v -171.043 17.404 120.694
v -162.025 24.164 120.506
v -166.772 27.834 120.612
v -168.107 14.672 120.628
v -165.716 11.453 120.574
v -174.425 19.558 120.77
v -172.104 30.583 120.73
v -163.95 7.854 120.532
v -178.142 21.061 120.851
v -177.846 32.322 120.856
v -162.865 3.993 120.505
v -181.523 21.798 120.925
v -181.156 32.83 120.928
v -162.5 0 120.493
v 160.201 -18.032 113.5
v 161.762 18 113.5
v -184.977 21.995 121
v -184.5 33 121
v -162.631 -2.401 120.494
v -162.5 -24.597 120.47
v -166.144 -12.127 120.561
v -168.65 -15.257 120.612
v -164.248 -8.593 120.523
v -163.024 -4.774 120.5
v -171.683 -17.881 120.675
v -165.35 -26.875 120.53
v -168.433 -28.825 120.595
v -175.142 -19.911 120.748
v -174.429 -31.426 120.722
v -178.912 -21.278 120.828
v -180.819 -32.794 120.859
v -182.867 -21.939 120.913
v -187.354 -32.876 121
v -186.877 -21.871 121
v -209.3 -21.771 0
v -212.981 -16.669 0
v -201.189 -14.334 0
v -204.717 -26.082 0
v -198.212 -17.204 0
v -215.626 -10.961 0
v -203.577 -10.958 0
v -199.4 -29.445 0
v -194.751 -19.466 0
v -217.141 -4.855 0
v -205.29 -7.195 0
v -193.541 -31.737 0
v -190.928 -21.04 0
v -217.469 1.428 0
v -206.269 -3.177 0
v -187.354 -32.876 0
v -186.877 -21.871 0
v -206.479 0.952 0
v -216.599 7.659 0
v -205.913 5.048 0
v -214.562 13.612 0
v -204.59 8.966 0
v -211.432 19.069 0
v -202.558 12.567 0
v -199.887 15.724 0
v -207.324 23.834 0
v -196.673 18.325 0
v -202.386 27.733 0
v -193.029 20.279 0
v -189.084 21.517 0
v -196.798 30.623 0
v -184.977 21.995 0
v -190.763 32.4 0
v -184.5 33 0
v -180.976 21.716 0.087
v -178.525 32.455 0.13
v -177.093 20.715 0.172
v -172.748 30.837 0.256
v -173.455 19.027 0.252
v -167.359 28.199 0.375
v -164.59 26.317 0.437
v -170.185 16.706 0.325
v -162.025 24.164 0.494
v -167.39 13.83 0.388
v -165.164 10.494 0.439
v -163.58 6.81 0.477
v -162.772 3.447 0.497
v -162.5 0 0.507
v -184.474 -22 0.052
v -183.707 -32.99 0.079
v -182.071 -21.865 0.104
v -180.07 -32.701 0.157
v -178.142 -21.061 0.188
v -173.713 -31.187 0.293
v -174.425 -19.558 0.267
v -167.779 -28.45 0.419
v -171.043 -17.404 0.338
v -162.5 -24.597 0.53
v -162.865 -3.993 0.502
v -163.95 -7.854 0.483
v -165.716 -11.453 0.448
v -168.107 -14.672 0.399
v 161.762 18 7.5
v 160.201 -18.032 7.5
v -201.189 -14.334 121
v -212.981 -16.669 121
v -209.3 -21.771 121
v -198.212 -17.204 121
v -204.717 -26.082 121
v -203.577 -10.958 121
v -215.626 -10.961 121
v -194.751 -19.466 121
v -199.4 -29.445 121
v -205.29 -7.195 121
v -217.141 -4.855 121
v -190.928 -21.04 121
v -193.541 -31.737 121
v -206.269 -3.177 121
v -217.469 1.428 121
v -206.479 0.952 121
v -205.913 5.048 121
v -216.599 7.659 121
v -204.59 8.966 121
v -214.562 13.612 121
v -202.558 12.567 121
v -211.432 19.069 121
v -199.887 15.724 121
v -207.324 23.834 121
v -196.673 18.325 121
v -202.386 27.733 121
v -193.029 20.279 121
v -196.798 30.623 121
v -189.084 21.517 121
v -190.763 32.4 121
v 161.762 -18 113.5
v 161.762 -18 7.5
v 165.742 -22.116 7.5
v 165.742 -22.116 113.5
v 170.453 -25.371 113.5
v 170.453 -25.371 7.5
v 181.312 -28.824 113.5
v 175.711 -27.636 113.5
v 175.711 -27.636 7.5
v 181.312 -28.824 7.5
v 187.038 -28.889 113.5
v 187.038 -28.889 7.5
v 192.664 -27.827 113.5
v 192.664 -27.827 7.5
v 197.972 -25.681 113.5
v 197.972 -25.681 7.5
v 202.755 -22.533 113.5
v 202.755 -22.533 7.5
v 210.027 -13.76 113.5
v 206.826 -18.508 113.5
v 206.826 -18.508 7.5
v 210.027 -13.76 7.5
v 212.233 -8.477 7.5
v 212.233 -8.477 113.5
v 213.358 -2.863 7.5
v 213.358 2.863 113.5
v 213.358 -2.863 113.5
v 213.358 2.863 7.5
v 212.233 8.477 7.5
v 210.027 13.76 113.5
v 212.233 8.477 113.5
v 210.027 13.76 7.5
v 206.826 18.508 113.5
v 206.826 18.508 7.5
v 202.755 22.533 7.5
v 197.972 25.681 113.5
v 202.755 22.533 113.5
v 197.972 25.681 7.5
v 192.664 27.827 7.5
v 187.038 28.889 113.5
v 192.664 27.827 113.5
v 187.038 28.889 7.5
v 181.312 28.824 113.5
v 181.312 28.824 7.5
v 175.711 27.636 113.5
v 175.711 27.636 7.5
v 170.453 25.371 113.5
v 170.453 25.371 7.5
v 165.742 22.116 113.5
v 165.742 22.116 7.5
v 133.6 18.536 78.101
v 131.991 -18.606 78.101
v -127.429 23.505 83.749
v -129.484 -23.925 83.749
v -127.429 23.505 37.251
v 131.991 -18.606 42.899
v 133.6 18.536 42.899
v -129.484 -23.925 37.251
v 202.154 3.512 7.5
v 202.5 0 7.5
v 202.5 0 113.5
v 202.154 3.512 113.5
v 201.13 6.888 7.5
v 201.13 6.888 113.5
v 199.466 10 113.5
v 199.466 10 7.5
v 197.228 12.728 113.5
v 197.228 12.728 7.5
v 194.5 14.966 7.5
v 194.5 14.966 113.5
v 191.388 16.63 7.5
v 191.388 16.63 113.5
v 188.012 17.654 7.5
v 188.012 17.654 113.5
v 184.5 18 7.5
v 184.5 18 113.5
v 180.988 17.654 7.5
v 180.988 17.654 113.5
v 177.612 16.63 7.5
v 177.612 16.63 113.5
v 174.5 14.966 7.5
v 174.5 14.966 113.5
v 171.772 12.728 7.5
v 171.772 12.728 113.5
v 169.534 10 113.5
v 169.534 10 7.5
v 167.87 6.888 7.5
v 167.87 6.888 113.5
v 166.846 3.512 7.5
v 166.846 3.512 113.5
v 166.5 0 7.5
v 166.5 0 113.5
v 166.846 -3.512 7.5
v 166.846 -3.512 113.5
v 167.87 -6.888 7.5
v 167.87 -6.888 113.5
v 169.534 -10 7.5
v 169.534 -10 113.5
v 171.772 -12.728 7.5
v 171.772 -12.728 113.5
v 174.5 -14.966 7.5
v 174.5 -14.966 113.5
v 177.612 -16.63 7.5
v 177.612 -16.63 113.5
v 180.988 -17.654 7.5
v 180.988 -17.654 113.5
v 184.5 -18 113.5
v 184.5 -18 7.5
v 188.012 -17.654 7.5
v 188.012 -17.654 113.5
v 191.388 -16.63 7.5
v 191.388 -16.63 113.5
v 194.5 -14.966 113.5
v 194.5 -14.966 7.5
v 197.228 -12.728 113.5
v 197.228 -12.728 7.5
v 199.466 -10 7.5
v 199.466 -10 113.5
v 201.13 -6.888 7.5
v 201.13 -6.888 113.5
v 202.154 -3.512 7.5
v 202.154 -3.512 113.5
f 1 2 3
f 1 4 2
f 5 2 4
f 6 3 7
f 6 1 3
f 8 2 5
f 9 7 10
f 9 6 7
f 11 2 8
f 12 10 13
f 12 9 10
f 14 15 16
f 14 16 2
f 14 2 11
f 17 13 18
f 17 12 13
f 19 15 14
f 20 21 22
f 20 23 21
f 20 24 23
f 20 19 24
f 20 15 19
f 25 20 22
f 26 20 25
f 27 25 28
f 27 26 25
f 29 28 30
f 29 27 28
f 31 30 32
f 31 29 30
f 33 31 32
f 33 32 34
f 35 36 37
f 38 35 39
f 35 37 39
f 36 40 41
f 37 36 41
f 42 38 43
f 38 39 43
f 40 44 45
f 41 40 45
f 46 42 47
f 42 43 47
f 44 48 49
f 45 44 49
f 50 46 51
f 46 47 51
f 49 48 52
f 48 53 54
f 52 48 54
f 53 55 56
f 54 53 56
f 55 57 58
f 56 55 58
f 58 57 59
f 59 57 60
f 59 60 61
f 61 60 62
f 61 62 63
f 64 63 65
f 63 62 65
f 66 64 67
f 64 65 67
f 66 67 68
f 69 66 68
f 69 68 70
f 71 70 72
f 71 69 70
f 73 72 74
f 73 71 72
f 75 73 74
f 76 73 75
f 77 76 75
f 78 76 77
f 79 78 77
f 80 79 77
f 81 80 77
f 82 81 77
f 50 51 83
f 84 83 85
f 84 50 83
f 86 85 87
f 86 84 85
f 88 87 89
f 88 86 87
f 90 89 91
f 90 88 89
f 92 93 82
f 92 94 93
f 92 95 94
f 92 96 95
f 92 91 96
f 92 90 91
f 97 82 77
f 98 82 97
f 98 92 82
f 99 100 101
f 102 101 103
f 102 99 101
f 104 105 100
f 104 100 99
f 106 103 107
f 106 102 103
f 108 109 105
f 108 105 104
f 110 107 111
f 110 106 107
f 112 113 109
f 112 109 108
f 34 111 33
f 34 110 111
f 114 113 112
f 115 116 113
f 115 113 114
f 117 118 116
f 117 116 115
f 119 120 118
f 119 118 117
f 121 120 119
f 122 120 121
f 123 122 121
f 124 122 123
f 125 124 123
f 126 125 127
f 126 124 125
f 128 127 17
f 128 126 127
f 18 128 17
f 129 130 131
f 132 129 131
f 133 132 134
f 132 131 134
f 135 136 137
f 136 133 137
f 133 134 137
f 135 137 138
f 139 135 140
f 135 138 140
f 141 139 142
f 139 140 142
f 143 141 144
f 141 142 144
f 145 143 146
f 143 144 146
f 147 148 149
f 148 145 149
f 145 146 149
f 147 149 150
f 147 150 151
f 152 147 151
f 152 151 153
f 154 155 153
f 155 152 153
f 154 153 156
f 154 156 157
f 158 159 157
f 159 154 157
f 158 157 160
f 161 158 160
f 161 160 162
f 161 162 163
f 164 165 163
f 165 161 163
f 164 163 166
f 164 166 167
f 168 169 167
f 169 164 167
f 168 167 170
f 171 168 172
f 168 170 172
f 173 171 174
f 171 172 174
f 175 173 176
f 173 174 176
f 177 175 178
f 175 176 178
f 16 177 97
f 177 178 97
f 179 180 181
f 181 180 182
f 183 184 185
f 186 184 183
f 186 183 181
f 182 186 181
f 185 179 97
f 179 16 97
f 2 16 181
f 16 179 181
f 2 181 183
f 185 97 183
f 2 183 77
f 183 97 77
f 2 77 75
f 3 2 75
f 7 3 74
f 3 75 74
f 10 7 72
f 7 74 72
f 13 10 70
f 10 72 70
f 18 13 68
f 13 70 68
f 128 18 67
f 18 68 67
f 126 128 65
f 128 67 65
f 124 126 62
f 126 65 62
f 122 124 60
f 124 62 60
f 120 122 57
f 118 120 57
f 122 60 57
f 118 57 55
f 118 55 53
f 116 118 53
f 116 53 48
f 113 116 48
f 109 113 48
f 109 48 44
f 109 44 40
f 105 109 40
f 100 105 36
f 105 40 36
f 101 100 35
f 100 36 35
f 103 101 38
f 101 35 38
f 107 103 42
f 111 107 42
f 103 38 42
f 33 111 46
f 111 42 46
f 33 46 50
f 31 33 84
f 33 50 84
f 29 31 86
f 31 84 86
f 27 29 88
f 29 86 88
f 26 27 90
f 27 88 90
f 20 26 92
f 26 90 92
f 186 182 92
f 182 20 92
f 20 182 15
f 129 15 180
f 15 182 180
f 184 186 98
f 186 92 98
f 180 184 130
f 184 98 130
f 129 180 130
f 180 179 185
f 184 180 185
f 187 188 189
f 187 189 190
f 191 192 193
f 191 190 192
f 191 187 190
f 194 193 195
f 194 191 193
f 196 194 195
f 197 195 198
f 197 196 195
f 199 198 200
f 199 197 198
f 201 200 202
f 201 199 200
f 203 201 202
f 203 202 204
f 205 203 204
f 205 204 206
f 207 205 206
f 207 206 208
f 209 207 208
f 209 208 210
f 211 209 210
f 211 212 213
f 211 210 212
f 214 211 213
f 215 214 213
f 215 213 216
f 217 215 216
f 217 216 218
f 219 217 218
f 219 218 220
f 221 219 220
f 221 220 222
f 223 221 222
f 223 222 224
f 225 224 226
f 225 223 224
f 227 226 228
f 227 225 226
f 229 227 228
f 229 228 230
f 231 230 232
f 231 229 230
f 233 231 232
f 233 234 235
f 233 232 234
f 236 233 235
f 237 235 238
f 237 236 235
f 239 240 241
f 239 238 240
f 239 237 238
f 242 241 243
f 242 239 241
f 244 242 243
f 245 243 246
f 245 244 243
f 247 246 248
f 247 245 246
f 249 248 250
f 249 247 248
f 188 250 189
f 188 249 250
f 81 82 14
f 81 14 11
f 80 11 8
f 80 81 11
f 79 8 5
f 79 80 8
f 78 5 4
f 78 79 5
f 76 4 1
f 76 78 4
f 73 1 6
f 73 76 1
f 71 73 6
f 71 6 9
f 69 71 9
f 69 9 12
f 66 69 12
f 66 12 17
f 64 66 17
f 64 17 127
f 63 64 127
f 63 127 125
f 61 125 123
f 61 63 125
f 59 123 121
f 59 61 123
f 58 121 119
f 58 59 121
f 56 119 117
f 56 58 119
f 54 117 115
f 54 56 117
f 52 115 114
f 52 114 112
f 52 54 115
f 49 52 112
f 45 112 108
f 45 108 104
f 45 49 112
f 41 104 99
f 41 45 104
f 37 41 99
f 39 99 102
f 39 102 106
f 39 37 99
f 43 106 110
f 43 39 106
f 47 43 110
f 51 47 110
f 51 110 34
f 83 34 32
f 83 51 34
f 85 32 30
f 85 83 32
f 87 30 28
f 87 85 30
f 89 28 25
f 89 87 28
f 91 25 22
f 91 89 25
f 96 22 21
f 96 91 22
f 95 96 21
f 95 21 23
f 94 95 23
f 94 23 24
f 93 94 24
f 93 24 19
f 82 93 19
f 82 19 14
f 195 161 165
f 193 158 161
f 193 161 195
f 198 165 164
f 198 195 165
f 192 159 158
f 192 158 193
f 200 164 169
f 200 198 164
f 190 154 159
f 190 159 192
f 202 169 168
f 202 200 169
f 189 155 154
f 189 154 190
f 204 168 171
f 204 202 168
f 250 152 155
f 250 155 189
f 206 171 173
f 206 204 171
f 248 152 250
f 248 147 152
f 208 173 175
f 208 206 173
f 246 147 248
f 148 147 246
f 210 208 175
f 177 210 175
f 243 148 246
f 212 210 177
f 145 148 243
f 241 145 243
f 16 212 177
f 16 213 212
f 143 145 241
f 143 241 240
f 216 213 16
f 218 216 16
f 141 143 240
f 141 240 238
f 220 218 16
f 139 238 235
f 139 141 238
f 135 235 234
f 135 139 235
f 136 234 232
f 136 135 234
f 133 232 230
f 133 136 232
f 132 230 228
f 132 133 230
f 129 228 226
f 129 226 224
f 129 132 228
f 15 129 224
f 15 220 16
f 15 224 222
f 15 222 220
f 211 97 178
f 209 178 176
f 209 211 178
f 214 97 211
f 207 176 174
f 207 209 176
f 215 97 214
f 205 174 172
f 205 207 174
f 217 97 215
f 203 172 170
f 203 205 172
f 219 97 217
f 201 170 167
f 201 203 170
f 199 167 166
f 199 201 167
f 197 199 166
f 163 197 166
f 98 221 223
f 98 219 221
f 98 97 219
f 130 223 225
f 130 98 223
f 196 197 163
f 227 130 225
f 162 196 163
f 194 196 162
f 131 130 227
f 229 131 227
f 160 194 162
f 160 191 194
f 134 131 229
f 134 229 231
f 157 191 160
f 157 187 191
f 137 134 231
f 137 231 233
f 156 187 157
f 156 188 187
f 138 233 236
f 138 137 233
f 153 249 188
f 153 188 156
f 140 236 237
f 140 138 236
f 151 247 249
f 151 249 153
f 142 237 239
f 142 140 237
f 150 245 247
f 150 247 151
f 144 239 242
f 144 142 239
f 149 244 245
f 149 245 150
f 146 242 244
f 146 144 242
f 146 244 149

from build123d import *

# Parameters (mm, degrees)
SKETCH1_R               = 22
SKETCH1_R_2             = 18
BOSS_EXTRUDE1_DEPTH     = 121
CUT_EXTRUDE2_DEPTH      = 121
CUT_EXTRUDE2_DEPTH_BACK = 121
CUT_EXTRUDE3_DEPTH      = 121
CUT_EXTRUDE3_DEPTH_BACK = 121


with BuildPart() as part:
    # Sketch1 → Boss-Extrude1 (new body)
    with BuildSketch(Plane.XY):
        with BuildLine():
            ThreePointArc((161.762365998, -18), (213.5, 0), (161.762365998, 18))
            Line((161.762365998, 18), (-162.025328377, 24.163798034))
            ThreePointArc((-162.025328377, 24.163798034), (-217.498436483, 0.321231462), (-162.5, -24.596747752))
            Line((-162.5, -24.596747752), (161.762365998, -18))
        make_face()
        with Locations((-184.5, 0)):
            Circle(SKETCH1_R, mode=Mode.SUBTRACT)
        with Locations((184.5, 0)):
            Circle(SKETCH1_R_2, mode=Mode.SUBTRACT)
    extrude(amount=BOSS_EXTRUDE1_DEPTH)

    # Sketch3 → Cut-Extrude2 (cut, two sides: drawn at the far end of the back side and taken through both)
    with BuildSketch(Plane(origin=(1.081289807, 24.960664454, 0), x_dir=(0.9990630180709081, -0.043279162688854546, 0), z_dir=(0.043279162688854546, 0.9990630180709081, 0)).offset(-CUT_EXTRUDE2_DEPTH_BACK)):
        Polygon((-185.755339203, 0), (160.831772656, -7.5), (275.239090967, -7.5), (275.239090967, 54.458825012), (-286.583387746, 54.458825012), (-286.583387746, 0), align=None)
        Polygon((275.239090967, -113.5), (160.831772656, -113.5), (-185.755339203, -121), (-286.583387746, -121), (-286.583387746, -184.896957676), (275.239090967, -184.896957676), align=None)
    extrude(amount=CUT_EXTRUDE2_DEPTH + CUT_EXTRUDE2_DEPTH_BACK, mode=Mode.SUBTRACT)

    # Sketch4 → Cut-Extrude3 (cut, two sides: drawn at the far end of the back side and taken through both)
    with BuildSketch(Plane(origin=(1.081289807, 24.960664454, 0), x_dir=(0.9990630180709081, -0.043279162688854546, 0), z_dir=(0.043279162688854546, 0.9990630180709081, 0)).offset(-CUT_EXTRUDE3_DEPTH_BACK)):
        Polygon((132.672873166, -42.899081104), (-128.327126834, -37.251150373), (-128.327126834, -83.748849627), (132.672873166, -78.100918896), align=None)
    extrude(amount=CUT_EXTRUDE3_DEPTH + CUT_EXTRUDE3_DEPTH_BACK, mode=Mode.SUBTRACT)


solid = part.part
